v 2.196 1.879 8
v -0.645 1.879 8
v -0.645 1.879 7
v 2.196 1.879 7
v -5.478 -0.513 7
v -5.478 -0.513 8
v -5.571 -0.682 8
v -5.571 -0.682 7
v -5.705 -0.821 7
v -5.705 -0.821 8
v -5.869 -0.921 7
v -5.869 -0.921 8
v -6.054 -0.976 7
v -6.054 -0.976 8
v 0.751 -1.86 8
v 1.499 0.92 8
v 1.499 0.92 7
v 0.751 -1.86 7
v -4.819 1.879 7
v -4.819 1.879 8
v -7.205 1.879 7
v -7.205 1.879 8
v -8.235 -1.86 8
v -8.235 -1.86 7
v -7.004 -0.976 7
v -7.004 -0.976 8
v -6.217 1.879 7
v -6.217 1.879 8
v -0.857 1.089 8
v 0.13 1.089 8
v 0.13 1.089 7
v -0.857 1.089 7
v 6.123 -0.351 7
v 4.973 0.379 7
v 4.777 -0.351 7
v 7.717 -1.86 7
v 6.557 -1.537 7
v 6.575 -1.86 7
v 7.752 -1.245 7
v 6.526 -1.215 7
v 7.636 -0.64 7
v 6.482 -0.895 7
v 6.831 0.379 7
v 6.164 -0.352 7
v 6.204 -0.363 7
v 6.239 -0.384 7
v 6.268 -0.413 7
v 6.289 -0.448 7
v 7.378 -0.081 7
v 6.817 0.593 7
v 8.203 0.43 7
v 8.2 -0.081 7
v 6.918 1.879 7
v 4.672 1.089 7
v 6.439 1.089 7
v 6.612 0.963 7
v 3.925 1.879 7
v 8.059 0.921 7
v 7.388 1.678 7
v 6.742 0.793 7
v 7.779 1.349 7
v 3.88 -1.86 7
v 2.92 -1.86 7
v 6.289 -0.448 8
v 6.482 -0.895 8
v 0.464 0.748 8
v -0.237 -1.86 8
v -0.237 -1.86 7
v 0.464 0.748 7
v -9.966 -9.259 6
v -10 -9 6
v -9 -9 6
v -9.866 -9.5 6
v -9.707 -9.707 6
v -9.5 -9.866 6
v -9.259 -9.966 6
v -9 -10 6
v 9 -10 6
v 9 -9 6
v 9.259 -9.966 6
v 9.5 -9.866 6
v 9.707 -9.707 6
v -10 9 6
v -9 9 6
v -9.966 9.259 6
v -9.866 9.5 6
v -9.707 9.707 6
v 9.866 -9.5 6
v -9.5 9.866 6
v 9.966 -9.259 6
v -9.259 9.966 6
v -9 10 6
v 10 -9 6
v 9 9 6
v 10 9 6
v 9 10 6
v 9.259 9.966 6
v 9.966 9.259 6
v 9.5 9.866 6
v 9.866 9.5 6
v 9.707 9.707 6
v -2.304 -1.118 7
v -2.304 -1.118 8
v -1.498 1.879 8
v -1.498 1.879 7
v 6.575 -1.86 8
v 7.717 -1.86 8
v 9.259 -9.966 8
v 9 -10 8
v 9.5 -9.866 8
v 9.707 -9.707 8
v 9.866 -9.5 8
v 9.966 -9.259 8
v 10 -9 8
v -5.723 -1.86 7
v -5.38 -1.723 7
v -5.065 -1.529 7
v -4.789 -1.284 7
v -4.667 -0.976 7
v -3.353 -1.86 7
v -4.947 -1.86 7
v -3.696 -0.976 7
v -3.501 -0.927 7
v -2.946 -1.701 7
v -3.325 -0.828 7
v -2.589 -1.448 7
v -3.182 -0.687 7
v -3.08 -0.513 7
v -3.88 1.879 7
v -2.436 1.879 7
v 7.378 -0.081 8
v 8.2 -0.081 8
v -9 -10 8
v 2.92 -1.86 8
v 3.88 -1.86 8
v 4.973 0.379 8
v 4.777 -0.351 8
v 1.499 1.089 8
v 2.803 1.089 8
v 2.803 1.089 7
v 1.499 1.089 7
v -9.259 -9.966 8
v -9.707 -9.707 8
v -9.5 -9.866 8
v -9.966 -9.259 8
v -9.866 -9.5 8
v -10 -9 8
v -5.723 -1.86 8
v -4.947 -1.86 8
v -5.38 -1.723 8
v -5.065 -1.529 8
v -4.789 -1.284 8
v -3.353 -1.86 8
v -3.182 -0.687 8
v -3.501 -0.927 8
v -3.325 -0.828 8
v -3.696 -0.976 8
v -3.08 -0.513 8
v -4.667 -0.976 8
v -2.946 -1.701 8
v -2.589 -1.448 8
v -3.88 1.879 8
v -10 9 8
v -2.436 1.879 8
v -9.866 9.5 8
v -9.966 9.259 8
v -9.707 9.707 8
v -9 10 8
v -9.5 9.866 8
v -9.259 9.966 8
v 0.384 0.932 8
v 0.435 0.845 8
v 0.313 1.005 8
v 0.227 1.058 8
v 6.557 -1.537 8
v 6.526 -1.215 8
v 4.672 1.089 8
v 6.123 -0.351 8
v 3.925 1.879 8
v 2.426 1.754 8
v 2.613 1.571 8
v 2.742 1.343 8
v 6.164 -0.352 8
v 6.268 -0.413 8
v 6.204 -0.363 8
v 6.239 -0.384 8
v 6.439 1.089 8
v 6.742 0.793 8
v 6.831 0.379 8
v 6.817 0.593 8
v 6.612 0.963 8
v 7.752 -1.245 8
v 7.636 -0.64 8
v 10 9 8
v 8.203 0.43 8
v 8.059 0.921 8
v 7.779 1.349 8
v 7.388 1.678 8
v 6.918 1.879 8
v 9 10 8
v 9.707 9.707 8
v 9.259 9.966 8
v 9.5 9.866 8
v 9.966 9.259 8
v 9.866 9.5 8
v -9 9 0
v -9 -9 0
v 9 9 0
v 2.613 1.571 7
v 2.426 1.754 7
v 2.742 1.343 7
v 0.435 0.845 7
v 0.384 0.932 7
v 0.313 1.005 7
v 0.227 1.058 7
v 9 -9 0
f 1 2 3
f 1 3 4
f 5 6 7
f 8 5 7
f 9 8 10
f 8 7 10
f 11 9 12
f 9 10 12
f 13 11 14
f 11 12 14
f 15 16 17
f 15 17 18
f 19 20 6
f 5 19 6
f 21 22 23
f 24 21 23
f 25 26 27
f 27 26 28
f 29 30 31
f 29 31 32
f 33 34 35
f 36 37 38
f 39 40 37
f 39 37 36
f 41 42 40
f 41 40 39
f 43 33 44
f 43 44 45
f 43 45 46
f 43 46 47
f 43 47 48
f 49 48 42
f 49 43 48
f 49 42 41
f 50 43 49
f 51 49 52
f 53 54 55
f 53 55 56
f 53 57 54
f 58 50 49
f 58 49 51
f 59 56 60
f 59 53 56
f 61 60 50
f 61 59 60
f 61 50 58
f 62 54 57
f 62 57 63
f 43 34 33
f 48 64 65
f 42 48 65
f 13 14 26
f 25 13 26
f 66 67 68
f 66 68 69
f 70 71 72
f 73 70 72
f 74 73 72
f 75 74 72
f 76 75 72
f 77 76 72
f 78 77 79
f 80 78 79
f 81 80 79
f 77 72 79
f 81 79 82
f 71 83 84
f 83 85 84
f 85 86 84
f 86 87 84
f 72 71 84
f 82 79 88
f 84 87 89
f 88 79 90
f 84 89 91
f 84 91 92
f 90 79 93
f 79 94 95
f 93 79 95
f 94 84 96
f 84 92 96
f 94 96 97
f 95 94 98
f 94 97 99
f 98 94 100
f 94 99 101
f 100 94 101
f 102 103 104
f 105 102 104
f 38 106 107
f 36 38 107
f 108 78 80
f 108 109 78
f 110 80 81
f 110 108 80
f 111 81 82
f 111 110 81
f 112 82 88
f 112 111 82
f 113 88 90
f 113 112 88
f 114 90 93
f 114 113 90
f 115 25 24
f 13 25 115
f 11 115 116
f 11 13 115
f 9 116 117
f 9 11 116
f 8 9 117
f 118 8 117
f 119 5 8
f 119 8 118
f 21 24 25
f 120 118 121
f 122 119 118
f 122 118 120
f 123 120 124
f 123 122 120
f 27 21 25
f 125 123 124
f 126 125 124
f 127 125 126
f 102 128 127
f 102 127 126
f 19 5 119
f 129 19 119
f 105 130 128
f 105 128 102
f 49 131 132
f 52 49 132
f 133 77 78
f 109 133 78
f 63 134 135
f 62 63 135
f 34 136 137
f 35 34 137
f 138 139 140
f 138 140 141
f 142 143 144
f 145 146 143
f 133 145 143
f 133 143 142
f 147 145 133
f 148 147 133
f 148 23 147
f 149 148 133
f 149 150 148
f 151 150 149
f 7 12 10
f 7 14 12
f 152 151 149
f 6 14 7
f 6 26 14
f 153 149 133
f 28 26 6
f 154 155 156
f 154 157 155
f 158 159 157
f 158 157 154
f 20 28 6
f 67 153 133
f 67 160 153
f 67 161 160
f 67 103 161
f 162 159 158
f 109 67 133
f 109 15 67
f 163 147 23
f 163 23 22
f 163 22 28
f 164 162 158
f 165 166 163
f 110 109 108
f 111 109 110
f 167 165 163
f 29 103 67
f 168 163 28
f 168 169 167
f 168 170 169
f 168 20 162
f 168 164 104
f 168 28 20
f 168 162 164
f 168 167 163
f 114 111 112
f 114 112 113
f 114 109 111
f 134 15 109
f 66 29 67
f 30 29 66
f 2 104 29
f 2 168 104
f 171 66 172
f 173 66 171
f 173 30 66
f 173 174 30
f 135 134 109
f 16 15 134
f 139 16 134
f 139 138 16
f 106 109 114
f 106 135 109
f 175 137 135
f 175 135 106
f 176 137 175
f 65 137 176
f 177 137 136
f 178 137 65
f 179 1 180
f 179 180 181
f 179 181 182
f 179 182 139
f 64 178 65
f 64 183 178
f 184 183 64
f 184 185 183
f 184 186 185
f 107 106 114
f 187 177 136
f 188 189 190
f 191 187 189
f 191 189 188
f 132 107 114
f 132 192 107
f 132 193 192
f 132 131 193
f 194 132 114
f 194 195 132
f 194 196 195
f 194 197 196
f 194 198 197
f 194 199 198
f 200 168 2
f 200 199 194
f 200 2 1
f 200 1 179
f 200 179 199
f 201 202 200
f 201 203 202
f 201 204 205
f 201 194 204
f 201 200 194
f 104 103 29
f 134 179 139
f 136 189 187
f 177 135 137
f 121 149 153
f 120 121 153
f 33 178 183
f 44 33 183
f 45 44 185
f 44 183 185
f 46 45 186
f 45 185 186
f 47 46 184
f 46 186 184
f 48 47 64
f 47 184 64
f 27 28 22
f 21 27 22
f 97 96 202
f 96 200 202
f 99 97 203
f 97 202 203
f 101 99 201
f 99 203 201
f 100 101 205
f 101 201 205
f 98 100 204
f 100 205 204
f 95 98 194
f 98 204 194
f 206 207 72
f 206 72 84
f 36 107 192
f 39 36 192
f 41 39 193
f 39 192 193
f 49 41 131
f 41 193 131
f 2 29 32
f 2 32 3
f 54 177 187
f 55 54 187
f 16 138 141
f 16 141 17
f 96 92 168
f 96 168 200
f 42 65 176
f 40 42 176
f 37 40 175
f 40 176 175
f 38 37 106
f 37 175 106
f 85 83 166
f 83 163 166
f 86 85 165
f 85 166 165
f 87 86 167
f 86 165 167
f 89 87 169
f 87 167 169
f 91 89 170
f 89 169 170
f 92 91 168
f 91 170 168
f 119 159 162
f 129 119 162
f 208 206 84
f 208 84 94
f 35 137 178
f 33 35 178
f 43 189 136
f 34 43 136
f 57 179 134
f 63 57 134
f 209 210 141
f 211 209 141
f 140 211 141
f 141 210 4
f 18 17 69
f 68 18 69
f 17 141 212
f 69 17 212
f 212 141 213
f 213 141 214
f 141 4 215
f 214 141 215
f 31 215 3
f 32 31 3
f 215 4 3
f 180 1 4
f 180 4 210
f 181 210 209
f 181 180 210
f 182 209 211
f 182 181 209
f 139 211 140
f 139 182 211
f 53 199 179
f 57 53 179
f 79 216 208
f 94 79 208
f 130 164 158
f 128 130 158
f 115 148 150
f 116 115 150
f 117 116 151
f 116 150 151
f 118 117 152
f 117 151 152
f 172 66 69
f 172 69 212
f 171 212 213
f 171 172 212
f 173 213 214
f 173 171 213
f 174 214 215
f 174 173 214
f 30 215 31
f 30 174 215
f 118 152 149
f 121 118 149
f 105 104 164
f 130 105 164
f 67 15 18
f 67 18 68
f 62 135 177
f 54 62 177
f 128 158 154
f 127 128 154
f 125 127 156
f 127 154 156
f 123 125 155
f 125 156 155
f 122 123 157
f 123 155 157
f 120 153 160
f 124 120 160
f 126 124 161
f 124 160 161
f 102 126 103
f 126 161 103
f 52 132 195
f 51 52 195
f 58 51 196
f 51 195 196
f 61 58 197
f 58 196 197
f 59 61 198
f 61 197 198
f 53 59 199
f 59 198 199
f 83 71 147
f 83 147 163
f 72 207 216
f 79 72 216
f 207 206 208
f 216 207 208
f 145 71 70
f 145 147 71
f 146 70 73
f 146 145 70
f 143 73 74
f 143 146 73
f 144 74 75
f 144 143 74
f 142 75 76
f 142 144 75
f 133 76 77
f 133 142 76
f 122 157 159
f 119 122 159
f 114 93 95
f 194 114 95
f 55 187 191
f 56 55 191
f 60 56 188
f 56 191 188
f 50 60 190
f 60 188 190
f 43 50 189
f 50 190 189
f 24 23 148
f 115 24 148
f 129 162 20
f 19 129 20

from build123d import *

# Parameters (mm, degrees)
SKETCH_1_W          = 18
SKETCH_1_H          = 18
EXTRUDE_1_DEPTH     = 6
SKETCH_3_W          = 20
SKETCH_3_H          = 20
EXTRUDE_2_DEPTH     = 2
FILLET_1_R          = 1
CUT_EXTRUDE_2_DEPTH = 1


with BuildPart() as part:
    # 草图1 → 凸台-拉伸1 (new body)
    with BuildSketch(Plane.XY):
        Rectangle(SKETCH_1_W, SKETCH_1_H)
    extrude(amount=EXTRUDE_1_DEPTH)

    # 草图3 → 凸台-拉伸2 (add)
    with BuildSketch(Plane.XY.offset(6)):
        Rectangle(SKETCH_3_W, SKETCH_3_H)
    extrude(amount=EXTRUDE_2_DEPTH)

    # 圆角1
    fillet_1_edges = [part.edges().sort_by_distance(p)[0] for p in [
        (10, -10, 7),
        (10, 10, 7),
        (-10, 10, 7),
        (-10, -10, 7),
    ]]
    fillet(fillet_1_edges, radius=FILLET_1_R)

    # 草图5 → 切除-拉伸2 (cut)
    with BuildSketch(Plane.XY.offset(8)):
        with BuildLine():
            Line((-7.204561004, 1.879394949), (-8.234522443, -1.859506165))
            Line((-8.234522443, -1.859506165), (-5.723109619, -1.859506165))
            ThreePointArc((-5.723109619, -1.859506165), (-5.218538697, -1.632457047), (-4.78861912, -1.284157931))
            Line((-4.78861912, -1.284157931), (-4.947111275, -1.859506165))
            Line((-4.947111275, -1.859506165), (-3.352787404, -1.859506165))
            ThreePointArc((-3.352787404, -1.859506165), (-2.759972983, -1.585355224), (-2.30360072, -1.118116491))
            Line((-2.30360072, -1.118116491), (-1.497804292, 1.879394949))
            Line((-1.497804292, 1.879394949), (-2.436323584, 1.879394949))
            Line((-2.436323584, 1.879394949), (-3.079504637, -0.513197642))
            ThreePointArc((-3.079504637, -0.513197642), (-3.32542599, -0.827982147), (-3.696433402, -0.976036515))
            Line((-3.696433402, -0.976036515), (-4.666789972, -0.976036515))
            Line((-4.666789972, -0.976036515), (-3.880199418, 1.879394949))
            Line((-3.880199418, 1.879394949), (-4.81871871, 1.879394949))
            Line((-4.81871871, 1.879394949), (-5.477810253, -0.513197642))
            ThreePointArc((-5.477810253, -0.513197642), (-5.7047457, -0.820725721), (-6.053961641, -0.976036515))
            Line((-6.053961641, -0.976036515), (-7.003517302, -0.976036515))
            Line((-7.003517302, -0.976036515), (-6.216926747, 1.879394949))
            Line((-6.216926747, 1.879394949), (-7.204561004, 1.879394949))
        make_face()
        with BuildLine():
            Line((-0.857127264, 1.088853082), (-0.644612375, 1.879394949))
            Line((-0.644612375, 1.879394949), (2.196209614, 1.879394949))
            ThreePointArc((2.196209614, 1.879394949), (2.612575491, 1.570775142), (2.803252851, 1.088853082))
            Line((2.803252851, 1.088853082), (1.498562909, 1.088853082))
            Line((1.498562909, 1.088853082), (1.498562909, 0.920146657))
            Line((1.498562909, 0.920146657), (0.751331627, -1.859506165))
            Line((0.751331627, -1.859506165), (-0.236975463, -1.859506165))
            Line((-0.236975463, -1.859506165), (0.463990432, 0.748042361))
            ThreePointArc((0.463990432, 0.748042361), (0.35056842, 0.970657535), (0.130450539, 1.088853082))
            Line((0.130450539, 1.088853082), (-0.857127264, 1.088853082))
        make_face()
        with BuildLine():
            Line((3.92496477, 1.879394949), (2.919866632, -1.859506165))
            Line((2.919866632, -1.859506165), (3.879786702, -1.859506165))
            Line((3.879786702, -1.859506165), (4.67236995, 1.088853082))
            Line((4.67236995, 1.088853082), (6.439189541, 1.088853082))
            ThreePointArc((6.439189541, 1.088853082), (6.74191311, 0.79302609), (6.831437365, 0.379334689))
            Line((6.831437365, 0.379334689), (4.973337874, 0.379334689))
            Line((4.973337874, 0.379334689), (4.777076341, -0.350745725))
            Line((4.777076341, -0.350745725), (6.123295998, -0.350745725))
            ThreePointArc((6.123295998, -0.350745725), (6.221884558, -0.372626448), (6.288711068, -0.448340962))
            Line((6.288711068, -0.448340962), (6.481965147, -0.894824524))
            ThreePointArc((6.481965147, -0.894824524), (6.543334906, -1.375731382), (6.574951556, -1.859506165))
            Line((6.574951556, -1.859506165), (7.717356009, -1.859506165))
            ThreePointArc((7.717356009, -1.859506165), (7.71253802, -0.938991532), (7.378394237, -0.081251283))
            Line((7.378394237, -0.081251283), (8.199786702, -0.081251283))
            ThreePointArc((8.199786702, -0.081251283), (7.934816182, 1.144935193), (6.917805112, 1.879394949))
            Line((6.917805112, 1.879394949), (3.92496477, 1.879394949))
        make_face()
    extrude(amount=-CUT_EXTRUDE_2_DEPTH, mode=Mode.SUBTRACT)


solid = part.part
